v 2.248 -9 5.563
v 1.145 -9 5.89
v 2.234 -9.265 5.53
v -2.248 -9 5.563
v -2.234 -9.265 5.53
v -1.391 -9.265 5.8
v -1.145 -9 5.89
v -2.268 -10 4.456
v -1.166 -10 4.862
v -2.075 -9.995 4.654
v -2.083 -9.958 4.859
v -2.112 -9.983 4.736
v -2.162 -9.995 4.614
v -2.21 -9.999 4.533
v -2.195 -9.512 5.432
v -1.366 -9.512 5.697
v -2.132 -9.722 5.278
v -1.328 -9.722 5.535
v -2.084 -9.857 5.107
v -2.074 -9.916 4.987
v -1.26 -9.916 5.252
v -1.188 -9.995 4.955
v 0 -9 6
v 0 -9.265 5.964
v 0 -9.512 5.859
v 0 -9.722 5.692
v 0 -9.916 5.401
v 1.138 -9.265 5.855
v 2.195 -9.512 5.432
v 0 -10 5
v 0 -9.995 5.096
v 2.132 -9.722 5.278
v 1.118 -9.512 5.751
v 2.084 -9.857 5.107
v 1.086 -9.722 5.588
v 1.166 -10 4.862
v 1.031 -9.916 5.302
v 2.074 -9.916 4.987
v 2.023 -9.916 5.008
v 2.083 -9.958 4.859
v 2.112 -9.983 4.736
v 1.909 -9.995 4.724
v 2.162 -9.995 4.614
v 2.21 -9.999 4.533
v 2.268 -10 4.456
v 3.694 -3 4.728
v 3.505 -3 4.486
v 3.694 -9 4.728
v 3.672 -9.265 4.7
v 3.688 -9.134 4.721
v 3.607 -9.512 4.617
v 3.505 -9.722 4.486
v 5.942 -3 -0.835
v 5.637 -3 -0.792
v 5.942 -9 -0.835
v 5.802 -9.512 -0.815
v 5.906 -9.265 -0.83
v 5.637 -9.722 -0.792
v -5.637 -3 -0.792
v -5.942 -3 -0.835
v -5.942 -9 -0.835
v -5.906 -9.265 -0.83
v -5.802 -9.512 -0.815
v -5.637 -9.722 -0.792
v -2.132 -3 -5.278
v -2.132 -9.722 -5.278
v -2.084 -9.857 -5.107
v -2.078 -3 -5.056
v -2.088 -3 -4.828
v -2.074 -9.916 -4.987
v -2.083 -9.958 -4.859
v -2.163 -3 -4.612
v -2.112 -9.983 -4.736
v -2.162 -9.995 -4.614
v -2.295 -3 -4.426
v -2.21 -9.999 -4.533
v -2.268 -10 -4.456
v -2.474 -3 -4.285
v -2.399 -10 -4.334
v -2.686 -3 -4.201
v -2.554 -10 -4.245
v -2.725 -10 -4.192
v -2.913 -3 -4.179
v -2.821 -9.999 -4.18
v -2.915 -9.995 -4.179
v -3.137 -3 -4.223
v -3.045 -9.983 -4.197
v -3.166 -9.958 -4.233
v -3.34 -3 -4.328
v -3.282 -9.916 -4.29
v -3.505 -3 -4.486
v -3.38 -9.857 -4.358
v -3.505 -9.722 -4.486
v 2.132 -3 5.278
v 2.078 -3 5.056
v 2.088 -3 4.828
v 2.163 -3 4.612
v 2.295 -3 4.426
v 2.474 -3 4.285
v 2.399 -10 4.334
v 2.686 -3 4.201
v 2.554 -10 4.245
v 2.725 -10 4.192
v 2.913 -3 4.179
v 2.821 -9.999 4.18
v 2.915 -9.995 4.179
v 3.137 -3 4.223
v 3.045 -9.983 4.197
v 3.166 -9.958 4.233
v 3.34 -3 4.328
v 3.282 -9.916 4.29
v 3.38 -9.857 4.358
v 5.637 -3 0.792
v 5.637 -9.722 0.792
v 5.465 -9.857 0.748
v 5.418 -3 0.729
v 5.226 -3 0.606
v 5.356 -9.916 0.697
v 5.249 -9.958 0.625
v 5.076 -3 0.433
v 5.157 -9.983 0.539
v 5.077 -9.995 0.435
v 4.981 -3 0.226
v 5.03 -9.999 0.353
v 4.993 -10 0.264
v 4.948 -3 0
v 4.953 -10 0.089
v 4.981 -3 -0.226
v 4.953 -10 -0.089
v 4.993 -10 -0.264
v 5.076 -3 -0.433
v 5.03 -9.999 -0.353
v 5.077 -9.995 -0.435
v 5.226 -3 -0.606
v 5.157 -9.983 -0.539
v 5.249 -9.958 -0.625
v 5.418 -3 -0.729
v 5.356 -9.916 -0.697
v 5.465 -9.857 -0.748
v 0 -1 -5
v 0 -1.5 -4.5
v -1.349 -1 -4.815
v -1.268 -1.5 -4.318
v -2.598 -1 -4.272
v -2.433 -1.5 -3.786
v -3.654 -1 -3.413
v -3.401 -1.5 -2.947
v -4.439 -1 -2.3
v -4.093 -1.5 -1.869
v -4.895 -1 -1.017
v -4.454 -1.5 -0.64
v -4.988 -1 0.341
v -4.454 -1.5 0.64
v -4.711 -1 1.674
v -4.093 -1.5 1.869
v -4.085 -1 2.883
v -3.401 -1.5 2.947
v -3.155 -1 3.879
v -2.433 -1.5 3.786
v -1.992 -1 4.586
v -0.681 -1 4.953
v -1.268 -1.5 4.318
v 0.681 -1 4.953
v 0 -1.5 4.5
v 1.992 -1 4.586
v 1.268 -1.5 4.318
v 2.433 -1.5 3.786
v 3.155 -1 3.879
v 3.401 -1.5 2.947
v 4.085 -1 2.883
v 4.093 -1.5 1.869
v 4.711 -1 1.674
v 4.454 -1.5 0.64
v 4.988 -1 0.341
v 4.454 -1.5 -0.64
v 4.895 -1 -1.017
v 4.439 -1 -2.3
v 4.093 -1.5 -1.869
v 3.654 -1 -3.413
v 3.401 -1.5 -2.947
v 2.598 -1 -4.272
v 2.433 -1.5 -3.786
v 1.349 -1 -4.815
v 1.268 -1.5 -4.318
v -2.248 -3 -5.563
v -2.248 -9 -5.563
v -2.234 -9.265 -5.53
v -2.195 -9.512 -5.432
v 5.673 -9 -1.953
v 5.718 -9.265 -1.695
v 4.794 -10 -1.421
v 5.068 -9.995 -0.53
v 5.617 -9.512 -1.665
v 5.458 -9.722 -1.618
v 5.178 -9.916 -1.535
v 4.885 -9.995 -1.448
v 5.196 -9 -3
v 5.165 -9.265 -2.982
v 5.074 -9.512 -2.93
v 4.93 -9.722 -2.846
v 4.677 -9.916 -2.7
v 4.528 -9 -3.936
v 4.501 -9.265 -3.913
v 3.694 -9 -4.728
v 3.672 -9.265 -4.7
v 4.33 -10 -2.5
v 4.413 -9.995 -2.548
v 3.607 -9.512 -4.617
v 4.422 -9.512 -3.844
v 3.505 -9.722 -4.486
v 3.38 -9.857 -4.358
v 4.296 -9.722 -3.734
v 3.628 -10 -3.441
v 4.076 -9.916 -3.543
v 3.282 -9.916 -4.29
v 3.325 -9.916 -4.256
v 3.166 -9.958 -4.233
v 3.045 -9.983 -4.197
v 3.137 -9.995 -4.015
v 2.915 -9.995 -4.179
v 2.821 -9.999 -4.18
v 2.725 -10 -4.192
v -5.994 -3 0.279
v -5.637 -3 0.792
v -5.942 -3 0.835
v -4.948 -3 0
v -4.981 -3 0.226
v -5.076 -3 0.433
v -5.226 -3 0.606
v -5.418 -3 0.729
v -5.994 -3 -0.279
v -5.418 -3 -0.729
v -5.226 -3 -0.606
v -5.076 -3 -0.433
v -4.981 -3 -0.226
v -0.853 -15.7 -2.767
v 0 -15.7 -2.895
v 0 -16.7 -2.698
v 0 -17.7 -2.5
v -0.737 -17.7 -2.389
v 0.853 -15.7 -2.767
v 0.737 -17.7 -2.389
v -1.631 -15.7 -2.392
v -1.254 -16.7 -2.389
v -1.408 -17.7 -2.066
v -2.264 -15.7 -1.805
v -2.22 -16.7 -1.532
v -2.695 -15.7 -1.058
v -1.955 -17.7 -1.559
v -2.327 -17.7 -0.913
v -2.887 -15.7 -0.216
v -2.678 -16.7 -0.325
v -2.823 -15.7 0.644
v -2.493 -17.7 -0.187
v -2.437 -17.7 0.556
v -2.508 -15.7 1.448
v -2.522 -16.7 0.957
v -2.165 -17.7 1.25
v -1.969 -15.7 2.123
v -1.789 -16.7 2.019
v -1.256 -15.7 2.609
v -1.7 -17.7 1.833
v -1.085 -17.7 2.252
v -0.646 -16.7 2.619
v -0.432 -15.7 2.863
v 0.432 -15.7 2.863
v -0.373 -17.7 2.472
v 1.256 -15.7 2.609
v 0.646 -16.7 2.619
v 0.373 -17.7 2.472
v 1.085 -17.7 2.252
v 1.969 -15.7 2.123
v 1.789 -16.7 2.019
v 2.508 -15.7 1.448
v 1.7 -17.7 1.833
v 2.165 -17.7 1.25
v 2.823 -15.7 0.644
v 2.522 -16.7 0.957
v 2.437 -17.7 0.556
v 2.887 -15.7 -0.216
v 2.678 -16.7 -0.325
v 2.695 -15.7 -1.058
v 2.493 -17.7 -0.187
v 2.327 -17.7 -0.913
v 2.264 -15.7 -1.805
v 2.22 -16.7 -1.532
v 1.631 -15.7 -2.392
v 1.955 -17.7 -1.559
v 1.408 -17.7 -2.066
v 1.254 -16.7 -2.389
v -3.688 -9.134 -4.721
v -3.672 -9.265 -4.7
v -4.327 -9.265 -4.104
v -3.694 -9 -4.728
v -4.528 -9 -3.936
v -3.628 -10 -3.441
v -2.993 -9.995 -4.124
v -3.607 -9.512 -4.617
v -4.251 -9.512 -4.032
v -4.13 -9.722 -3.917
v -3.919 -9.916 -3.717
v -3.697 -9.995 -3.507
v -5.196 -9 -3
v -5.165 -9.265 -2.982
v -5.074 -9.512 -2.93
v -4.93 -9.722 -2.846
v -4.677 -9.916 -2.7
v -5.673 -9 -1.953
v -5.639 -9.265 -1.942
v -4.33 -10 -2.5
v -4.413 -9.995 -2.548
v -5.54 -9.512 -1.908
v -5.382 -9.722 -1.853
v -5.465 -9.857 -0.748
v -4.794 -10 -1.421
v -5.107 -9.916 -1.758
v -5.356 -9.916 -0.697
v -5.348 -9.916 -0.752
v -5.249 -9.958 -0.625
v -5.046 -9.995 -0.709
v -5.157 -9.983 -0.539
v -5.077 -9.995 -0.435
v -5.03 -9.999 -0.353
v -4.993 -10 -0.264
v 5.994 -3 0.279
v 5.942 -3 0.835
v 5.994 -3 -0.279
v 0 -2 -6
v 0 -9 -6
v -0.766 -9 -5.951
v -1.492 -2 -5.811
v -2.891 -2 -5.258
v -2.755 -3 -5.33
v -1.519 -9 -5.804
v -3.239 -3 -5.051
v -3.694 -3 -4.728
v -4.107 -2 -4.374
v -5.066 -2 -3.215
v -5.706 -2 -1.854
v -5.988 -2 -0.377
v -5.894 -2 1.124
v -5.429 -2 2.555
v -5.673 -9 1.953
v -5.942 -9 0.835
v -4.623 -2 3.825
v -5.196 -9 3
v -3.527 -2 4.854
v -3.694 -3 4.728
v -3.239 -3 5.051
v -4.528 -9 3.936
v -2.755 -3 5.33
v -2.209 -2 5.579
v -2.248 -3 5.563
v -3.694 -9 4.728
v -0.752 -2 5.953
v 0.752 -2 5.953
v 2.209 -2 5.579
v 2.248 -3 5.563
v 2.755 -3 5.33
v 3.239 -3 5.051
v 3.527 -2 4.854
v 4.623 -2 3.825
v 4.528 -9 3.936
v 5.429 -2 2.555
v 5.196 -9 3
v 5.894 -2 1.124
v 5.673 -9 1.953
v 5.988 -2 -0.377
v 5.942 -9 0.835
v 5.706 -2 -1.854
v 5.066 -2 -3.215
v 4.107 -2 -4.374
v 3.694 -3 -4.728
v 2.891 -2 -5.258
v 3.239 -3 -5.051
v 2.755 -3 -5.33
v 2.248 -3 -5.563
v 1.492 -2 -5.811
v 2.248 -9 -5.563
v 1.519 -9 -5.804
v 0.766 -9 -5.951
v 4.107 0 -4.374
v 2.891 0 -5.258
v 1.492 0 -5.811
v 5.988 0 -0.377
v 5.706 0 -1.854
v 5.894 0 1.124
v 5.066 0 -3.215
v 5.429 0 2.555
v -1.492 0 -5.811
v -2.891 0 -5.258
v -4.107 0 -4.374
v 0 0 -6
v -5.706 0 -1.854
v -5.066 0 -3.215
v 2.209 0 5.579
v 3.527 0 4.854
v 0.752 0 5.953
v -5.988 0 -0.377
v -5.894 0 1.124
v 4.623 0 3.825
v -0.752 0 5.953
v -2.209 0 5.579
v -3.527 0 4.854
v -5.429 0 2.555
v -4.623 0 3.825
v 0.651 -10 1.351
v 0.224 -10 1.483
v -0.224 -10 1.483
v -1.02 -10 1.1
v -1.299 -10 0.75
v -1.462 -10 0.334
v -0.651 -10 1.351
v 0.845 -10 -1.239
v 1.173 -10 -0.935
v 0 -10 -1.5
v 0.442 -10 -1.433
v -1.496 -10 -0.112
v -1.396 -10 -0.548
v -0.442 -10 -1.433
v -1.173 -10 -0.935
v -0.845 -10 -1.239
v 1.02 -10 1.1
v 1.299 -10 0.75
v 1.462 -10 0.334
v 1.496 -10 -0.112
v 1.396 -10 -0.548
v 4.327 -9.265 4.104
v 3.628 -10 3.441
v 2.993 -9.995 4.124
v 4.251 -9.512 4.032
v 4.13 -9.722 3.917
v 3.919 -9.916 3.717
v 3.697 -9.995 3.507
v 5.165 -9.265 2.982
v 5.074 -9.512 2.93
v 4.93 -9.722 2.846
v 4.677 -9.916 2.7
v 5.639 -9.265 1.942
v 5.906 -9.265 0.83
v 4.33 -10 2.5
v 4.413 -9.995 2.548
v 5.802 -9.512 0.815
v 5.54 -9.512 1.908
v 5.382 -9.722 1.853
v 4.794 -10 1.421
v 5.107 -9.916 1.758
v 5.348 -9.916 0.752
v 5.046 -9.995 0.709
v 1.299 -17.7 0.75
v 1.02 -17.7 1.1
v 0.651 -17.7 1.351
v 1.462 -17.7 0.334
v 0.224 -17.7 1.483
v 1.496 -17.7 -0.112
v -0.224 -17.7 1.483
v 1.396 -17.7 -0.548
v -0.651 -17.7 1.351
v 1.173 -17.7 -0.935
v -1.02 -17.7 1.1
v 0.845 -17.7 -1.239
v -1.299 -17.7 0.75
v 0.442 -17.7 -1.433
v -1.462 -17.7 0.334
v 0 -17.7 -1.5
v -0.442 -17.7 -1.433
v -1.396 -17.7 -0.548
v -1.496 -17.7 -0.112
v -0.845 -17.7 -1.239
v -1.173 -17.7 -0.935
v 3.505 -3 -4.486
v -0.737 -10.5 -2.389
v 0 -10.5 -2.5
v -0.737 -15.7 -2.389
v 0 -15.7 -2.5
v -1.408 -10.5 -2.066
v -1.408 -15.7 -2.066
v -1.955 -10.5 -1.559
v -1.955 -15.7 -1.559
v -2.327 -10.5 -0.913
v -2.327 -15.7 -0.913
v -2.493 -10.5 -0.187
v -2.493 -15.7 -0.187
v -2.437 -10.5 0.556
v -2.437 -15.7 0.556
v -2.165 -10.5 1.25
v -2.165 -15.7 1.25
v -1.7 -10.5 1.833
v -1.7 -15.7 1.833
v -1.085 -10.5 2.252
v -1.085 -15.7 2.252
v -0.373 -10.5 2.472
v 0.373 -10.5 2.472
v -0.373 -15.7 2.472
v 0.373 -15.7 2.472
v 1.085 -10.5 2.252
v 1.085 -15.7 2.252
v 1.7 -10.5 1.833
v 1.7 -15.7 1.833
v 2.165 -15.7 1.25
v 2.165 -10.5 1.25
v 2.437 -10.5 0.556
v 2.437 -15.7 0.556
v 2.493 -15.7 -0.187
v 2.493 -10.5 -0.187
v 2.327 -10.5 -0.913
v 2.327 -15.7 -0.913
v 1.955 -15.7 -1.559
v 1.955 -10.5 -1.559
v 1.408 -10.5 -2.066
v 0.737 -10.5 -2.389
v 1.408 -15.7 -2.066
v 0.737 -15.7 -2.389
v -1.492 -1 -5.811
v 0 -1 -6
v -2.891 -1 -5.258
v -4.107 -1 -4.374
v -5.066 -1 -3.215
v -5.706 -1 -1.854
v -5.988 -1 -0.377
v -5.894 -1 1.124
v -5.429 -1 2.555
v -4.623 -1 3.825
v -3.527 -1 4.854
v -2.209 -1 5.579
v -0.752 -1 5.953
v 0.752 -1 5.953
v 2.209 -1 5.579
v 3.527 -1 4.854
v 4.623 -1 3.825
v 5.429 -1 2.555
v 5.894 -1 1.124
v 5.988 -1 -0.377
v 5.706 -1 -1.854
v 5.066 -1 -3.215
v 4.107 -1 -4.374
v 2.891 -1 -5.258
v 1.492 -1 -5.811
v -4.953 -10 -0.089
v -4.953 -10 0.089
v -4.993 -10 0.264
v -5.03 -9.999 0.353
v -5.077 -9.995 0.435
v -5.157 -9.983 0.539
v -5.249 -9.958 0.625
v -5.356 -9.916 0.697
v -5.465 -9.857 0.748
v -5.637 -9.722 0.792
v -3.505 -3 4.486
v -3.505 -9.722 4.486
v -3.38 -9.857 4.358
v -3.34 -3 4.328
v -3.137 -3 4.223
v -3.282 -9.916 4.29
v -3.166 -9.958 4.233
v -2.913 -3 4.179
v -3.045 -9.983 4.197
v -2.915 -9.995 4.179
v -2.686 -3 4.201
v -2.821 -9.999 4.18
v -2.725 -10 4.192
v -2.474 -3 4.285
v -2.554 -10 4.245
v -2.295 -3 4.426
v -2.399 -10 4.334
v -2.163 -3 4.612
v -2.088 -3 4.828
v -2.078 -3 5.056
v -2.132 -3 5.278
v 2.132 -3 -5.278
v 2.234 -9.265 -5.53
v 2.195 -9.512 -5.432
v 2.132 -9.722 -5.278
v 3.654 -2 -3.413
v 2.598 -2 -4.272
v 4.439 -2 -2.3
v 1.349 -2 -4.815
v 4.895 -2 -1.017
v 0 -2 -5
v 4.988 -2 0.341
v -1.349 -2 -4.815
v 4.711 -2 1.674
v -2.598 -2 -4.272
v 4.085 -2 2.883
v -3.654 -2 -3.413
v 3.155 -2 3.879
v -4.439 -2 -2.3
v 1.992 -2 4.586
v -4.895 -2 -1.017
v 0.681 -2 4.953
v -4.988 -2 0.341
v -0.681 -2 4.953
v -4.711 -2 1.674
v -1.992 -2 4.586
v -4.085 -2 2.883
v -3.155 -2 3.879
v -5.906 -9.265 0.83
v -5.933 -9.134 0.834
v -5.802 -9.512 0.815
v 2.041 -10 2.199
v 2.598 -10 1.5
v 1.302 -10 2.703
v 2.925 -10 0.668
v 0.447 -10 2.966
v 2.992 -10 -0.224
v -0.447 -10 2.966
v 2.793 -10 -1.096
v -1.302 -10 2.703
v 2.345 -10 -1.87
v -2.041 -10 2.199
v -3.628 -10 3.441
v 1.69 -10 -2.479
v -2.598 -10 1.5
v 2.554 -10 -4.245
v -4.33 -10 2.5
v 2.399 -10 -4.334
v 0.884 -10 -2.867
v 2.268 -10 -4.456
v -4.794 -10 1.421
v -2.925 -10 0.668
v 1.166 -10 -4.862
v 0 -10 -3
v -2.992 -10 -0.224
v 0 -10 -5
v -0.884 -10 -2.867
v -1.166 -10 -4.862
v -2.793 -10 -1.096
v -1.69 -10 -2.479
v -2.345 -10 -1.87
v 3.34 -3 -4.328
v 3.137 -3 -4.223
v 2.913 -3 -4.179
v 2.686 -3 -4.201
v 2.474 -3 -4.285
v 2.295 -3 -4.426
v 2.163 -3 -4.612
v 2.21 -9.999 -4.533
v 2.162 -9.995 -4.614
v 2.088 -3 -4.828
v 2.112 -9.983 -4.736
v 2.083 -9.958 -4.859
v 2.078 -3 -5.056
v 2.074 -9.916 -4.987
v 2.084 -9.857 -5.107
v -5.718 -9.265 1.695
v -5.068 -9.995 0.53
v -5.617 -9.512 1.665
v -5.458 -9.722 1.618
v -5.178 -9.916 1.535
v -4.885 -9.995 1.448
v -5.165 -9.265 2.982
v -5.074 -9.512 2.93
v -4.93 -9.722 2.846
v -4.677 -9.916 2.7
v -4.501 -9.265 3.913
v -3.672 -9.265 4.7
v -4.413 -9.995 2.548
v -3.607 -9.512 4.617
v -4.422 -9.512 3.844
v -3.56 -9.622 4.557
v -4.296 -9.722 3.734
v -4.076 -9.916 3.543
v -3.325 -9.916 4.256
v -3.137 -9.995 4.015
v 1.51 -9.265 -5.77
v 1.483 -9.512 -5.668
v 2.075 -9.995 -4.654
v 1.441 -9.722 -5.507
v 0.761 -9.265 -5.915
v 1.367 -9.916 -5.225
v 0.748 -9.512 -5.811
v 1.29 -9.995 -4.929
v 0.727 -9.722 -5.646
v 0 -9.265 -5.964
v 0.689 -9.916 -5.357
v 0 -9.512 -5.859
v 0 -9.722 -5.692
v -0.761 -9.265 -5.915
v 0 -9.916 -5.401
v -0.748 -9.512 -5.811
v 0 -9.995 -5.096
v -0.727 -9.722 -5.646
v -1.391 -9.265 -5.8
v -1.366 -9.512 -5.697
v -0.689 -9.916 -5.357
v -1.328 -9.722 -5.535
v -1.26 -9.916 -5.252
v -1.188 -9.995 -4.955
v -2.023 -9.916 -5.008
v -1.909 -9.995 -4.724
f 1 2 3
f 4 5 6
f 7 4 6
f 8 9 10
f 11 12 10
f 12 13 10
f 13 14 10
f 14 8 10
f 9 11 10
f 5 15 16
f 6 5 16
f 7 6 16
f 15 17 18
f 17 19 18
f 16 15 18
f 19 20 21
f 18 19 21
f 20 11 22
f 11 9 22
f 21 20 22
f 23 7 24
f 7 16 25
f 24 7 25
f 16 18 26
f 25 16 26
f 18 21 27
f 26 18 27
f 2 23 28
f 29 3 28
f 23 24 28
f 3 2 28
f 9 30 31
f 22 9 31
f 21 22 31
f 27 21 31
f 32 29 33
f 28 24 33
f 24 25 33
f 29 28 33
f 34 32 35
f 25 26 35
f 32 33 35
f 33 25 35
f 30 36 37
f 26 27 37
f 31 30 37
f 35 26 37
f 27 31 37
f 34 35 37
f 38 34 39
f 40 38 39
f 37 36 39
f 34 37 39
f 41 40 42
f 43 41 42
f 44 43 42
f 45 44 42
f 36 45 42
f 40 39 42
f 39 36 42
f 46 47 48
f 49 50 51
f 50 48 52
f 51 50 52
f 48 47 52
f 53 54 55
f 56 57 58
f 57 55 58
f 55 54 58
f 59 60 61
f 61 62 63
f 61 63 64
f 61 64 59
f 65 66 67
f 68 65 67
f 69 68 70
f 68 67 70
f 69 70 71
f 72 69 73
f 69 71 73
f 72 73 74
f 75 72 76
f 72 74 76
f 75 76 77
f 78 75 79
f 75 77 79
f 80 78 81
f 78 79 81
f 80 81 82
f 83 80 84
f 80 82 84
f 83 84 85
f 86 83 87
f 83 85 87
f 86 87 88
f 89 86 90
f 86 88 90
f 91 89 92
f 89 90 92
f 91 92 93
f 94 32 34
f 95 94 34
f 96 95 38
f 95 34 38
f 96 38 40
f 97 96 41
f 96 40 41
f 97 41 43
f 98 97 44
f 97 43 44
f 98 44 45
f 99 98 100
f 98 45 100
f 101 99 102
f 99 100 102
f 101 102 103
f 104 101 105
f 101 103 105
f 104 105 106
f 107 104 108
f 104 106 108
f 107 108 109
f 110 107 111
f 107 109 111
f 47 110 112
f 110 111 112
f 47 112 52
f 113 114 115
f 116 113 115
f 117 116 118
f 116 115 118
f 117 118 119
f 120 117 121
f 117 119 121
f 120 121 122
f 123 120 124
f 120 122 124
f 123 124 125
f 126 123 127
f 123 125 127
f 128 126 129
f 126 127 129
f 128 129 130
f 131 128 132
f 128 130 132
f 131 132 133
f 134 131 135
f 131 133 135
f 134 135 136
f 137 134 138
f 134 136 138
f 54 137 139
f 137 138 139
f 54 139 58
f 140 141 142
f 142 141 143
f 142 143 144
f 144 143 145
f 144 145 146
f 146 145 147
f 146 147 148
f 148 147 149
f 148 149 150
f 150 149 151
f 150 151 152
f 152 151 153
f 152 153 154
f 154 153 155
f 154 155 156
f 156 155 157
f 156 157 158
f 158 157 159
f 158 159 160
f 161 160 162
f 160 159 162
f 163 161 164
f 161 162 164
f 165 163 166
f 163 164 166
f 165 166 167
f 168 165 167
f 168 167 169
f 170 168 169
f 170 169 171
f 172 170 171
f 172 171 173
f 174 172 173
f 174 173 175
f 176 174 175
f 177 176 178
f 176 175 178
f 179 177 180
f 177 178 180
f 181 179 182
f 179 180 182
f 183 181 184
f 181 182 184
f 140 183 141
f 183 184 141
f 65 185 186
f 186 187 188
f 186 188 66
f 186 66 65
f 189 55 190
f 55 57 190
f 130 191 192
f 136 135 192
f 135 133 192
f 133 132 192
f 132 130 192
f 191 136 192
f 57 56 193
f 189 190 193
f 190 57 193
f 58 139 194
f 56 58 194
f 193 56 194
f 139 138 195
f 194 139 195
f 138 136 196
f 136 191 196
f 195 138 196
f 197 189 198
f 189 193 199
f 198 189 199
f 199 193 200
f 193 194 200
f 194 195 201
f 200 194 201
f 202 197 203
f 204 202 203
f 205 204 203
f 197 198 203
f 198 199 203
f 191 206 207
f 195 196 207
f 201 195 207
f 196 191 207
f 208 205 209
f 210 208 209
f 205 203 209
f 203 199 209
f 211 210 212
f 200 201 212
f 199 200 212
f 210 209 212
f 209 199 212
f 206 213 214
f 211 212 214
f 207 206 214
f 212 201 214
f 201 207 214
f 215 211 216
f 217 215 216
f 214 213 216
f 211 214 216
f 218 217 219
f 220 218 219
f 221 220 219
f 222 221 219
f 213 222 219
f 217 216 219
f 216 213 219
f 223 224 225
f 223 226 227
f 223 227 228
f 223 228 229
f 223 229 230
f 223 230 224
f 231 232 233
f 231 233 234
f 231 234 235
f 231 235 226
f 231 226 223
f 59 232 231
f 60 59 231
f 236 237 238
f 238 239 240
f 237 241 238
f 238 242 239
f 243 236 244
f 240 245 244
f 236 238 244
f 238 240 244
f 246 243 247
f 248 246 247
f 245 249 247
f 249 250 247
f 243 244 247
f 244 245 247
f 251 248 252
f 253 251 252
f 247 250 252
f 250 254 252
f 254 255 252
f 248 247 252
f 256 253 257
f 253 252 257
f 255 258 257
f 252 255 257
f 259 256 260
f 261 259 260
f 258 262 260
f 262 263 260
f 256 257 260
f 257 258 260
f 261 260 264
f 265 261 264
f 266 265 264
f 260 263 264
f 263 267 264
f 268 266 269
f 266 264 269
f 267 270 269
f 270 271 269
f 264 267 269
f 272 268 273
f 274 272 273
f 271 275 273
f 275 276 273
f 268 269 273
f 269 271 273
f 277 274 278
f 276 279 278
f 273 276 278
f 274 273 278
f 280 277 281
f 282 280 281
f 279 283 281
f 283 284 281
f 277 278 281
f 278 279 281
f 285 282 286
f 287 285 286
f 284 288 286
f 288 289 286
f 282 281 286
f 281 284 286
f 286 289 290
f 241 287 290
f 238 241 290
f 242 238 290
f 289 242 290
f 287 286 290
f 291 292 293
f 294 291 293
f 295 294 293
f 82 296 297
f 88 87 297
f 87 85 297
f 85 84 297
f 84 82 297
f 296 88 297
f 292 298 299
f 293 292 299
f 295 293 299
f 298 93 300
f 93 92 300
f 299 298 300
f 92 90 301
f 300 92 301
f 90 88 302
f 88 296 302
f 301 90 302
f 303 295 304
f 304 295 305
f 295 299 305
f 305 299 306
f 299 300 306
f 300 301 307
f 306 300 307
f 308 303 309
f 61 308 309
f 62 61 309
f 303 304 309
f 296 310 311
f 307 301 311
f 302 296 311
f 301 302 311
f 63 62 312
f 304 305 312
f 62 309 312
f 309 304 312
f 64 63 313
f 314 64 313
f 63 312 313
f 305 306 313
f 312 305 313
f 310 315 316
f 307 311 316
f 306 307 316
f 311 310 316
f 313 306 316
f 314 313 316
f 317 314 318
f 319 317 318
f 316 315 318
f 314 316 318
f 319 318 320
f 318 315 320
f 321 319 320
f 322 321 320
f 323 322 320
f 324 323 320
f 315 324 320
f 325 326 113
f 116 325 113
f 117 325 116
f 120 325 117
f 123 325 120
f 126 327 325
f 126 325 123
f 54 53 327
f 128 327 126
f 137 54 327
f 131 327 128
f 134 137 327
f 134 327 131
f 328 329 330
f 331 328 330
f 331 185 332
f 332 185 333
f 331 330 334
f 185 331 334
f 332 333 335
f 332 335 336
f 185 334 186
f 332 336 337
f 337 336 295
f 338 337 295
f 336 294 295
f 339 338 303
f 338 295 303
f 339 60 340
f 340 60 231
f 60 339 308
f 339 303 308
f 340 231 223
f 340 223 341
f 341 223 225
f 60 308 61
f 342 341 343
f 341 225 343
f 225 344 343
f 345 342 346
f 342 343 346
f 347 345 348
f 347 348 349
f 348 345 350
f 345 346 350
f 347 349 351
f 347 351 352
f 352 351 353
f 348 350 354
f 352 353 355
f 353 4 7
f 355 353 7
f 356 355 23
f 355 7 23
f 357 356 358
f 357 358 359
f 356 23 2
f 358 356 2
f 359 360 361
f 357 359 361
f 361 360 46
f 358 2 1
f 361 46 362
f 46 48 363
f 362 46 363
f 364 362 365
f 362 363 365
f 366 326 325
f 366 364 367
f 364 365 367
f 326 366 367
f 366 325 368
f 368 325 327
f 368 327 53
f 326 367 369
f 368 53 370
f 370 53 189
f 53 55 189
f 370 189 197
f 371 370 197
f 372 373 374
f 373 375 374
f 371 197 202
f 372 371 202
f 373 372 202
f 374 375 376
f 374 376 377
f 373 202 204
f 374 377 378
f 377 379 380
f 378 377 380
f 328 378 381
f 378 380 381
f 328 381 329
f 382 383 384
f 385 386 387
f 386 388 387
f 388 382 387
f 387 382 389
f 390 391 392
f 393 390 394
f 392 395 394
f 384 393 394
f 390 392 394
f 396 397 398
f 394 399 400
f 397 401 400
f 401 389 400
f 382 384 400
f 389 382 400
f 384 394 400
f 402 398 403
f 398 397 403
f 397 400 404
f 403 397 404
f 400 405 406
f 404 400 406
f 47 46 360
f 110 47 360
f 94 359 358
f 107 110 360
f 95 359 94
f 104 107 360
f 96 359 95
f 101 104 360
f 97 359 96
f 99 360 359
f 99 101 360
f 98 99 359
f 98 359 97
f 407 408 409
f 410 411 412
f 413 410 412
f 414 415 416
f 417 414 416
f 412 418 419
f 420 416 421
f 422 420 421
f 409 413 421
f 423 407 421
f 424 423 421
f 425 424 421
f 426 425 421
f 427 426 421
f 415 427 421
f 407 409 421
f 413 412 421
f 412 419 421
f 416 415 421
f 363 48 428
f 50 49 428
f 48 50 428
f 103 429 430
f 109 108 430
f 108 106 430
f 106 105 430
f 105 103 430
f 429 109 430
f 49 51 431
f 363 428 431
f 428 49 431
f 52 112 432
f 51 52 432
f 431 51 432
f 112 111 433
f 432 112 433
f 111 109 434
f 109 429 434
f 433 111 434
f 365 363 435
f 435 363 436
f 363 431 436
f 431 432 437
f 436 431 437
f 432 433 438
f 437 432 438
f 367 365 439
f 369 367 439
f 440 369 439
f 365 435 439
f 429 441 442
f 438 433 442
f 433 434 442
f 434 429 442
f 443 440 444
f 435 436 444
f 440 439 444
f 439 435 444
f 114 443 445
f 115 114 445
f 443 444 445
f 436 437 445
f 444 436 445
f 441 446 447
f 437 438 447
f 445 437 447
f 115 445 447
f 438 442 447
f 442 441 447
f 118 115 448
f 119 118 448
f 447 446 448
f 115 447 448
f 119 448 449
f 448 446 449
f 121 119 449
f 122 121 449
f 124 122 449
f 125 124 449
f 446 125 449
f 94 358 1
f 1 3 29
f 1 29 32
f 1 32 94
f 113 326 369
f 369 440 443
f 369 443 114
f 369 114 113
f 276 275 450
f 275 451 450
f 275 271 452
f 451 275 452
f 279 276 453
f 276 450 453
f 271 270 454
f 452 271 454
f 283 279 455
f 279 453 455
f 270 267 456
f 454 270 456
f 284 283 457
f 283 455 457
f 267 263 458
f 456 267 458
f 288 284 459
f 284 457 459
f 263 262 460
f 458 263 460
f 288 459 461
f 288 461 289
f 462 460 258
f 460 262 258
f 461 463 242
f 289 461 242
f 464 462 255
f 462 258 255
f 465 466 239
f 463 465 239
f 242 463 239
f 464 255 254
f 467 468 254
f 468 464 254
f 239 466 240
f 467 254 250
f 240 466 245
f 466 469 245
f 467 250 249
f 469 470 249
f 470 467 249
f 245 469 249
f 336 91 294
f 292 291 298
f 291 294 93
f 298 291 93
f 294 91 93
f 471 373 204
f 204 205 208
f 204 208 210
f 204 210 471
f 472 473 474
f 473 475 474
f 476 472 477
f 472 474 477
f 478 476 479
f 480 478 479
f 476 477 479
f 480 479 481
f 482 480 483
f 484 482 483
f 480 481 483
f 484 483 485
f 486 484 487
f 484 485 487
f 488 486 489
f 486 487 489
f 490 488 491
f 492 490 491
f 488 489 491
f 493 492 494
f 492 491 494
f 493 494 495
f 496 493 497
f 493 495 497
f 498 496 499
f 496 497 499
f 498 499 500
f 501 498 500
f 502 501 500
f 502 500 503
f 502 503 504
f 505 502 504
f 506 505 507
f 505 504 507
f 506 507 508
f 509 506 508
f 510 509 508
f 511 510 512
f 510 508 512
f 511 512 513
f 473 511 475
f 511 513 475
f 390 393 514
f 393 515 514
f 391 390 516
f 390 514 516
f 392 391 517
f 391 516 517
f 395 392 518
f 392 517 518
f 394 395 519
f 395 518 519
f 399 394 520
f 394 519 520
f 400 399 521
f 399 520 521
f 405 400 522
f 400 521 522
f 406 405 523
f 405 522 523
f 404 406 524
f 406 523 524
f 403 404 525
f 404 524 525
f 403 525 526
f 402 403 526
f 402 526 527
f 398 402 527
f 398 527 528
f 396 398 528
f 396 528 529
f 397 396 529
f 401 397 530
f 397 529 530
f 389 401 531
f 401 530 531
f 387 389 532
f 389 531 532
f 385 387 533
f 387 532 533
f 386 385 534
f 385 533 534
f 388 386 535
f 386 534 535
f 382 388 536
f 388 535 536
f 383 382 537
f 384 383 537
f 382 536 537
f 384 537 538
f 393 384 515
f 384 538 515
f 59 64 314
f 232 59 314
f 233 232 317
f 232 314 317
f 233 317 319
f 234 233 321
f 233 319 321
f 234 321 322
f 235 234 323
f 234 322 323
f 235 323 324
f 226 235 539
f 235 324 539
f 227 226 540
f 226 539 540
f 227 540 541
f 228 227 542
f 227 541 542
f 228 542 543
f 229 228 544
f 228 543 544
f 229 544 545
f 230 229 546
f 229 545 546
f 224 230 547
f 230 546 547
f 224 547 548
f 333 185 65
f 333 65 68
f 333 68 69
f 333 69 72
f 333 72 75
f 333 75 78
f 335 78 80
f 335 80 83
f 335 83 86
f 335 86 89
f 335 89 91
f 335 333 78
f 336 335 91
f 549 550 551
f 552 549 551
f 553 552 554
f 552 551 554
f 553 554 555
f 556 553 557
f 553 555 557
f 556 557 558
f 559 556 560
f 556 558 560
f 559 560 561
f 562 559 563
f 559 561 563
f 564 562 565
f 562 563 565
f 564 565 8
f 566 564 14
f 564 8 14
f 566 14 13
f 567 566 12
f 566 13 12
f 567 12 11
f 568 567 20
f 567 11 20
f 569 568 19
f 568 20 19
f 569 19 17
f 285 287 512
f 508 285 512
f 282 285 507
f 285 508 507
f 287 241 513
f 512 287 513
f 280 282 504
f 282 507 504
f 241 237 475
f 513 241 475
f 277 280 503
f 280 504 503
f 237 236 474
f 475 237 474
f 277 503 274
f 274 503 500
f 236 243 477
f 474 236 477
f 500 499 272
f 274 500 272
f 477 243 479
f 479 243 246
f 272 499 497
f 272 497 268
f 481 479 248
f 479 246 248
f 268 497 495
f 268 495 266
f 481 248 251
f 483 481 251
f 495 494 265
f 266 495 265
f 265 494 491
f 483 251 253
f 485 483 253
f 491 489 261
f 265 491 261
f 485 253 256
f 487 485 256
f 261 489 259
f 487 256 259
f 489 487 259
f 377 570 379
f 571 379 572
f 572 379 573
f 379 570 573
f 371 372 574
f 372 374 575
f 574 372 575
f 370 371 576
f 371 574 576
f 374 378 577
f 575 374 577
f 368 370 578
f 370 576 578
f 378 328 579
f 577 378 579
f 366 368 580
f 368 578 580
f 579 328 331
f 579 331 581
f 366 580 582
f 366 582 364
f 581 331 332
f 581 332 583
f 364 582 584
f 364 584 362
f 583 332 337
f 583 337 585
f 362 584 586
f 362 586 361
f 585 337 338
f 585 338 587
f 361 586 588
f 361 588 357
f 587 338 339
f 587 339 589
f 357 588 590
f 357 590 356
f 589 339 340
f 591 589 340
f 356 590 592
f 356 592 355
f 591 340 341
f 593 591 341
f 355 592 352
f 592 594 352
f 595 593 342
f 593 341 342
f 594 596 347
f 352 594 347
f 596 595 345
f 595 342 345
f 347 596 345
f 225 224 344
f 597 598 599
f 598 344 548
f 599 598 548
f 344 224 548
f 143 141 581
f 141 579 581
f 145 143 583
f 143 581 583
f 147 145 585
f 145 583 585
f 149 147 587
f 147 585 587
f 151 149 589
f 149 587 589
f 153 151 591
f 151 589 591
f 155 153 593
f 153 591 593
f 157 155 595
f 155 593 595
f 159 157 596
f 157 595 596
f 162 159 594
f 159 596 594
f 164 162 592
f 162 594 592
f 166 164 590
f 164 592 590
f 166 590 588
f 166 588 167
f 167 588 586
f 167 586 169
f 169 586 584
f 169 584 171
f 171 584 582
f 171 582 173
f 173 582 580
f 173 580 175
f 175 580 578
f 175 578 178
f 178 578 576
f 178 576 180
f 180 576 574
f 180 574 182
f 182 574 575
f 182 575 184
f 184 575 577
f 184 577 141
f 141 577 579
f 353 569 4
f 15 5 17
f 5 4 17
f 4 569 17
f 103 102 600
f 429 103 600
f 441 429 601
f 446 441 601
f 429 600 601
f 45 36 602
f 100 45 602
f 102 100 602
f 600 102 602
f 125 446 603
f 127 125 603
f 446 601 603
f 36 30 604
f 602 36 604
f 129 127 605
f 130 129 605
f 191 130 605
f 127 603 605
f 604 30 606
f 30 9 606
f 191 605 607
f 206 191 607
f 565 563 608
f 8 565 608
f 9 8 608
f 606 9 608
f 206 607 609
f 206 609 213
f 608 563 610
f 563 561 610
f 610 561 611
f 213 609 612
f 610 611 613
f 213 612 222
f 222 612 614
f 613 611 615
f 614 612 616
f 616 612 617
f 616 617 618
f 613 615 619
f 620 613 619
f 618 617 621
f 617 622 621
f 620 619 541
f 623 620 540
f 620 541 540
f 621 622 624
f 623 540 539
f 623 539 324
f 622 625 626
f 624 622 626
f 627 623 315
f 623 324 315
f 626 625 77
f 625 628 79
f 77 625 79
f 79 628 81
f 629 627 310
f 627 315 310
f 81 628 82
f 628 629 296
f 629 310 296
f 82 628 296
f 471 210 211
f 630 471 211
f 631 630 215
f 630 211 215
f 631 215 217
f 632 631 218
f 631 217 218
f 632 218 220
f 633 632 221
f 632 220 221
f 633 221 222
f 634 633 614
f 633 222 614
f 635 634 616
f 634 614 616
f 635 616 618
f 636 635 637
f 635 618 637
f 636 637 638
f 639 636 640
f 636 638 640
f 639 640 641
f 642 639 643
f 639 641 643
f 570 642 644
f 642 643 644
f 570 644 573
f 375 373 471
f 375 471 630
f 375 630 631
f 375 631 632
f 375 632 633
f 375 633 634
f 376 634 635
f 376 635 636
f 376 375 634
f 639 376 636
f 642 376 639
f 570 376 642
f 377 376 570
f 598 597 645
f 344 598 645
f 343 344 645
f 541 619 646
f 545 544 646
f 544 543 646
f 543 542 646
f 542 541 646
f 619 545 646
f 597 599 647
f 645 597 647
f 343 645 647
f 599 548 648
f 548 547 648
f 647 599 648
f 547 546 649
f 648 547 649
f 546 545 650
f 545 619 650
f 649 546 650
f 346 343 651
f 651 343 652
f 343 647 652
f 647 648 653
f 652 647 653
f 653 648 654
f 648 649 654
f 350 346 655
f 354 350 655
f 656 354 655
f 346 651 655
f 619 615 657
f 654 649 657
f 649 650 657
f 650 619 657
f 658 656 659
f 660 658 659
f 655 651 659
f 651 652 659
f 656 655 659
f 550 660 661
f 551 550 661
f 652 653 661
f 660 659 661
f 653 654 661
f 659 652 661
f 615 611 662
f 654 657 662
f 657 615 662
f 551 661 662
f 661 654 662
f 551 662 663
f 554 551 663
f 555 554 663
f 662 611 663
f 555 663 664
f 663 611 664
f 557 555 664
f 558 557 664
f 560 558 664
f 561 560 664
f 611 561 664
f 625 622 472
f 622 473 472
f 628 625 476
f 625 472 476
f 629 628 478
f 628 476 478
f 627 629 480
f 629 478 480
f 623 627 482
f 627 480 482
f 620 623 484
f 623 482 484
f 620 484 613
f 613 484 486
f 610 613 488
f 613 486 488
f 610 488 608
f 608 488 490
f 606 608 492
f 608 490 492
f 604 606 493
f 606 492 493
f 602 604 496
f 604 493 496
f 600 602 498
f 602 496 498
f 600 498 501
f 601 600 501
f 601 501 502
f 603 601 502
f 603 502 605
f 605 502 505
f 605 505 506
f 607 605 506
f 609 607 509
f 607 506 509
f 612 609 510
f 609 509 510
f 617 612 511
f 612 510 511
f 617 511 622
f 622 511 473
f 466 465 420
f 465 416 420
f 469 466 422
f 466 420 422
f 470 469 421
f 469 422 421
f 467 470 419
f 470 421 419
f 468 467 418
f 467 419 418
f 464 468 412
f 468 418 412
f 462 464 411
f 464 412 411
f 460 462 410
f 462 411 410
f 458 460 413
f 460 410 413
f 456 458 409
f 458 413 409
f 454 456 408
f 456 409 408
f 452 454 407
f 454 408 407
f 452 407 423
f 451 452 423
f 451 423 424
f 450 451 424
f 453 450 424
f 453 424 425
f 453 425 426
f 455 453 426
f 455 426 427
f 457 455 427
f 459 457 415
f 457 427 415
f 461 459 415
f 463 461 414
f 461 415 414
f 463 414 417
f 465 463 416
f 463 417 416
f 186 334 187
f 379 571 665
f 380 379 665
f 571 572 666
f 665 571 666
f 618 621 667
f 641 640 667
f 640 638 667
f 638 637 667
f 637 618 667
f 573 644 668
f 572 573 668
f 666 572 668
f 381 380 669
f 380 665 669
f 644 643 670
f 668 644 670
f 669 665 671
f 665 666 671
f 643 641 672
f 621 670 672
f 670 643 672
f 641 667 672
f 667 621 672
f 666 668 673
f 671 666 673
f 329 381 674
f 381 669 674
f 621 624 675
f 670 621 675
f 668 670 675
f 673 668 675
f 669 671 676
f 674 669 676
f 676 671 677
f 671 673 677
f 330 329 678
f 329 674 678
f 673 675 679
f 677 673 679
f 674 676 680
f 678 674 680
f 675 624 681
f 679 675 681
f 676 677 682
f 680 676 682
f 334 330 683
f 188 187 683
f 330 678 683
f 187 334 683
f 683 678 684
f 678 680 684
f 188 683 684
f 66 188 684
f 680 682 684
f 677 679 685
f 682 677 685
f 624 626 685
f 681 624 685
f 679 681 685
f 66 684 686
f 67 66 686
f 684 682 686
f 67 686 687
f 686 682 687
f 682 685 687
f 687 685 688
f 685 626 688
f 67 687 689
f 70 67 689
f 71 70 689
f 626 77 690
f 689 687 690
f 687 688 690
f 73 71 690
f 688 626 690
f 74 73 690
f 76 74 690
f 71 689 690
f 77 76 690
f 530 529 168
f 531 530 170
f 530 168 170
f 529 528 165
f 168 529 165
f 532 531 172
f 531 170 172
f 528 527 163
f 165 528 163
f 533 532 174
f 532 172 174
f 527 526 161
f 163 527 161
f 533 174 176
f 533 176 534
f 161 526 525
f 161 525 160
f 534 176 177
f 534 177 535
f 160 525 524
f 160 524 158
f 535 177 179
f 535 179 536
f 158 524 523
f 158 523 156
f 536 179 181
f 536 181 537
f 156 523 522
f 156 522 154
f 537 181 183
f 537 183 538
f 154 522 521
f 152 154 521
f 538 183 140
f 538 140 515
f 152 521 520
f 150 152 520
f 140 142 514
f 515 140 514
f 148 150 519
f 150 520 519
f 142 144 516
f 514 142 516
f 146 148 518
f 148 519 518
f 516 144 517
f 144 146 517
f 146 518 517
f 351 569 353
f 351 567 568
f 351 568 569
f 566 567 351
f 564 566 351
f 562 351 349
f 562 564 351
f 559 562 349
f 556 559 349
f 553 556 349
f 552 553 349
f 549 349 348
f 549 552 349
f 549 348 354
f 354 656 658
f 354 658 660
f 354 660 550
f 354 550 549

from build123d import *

# Parameters (mm, degrees)
CUT_EXTRUDE1_DEPTH      = 7
CUT_EXTRUDE1_DEPTH_BACK = 7


with BuildPart() as part:
    # Sketch1 → Revolve1 (revolve)
    with BuildSketch(Plane(origin=(0, 0, 0), x_dir=(0, 0, -1), z_dir=(1, 0, 0))):
        with BuildLine():
            Line((0, 0), (6, 0))
            Line((6, 0), (6, -1))
            Line((6, -1), (5, -1))
            Line((5, -1), (4.5, -1.5))
            Line((4.5, -1.5), (5, -2))
            Line((5, -2), (6, -2))
            Line((6, -2), (6, -9))
            ThreePointArc((6, -9), (5.707106781, -9.707106781), (5, -10))
            Line((5, -10), (3, -10))
            Line((3, -10), (2.5, -10.5))
            Line((2.5, -10.5), (2.5, -15.7))
            Line((2.5, -15.7), (2.895480226, -15.7))
            Line((2.895480226, -15.7), (2.5, -17.7))
            Line((2.5, -17.7), (1.5, -17.7))
            Line((1.5, -17.7), (1.5, -10))
            Line((1.5, -10), (0, -10))
            Line((0, -10), (0, 0))
        make_face()
    revolve(axis=Axis((0, -17.7, 0), (0, 1, 0)))

    # Sketch2 → Cut-Extrude1 (cut, two sides)
    with BuildSketch(Plane(origin=(0, -10, 0), x_dir=(-1, 0, 0), z_dir=(0, -1, 0))) as cut_extrude1_sk:
        with BuildLine():
            Line((-1, -14.966629547), (-1, -9.949874371))
            ThreePointArc((-1, -9.949874371), (-2.397127157, -9.708438669), (-3.746065934, -9.271838546))
            Line((-3.746065934, -9.271838546), (-2.13237153, -5.277804741))
            ThreePointArc((-2.13237153, -5.277804741), (-2.474118614, -4.285299143), (-3.504527217, -4.485590286))
            Line((-3.504527217, -4.485590286), (-6.156614753, -7.880107536))
            ThreePointArc((-6.156614753, -7.880107536), (-8.660254038, -5), (-9.902680687, -1.39173101))
            Line((-9.902680687, -1.39173101), (-5.636898747, -0.792214455))
            ThreePointArc((-5.636898747, -0.792214455), (-4.948237227, 0), (-5.636898747, 0.792214455))
            Line((-5.636898747, 0.792214455), (-9.902680687, 1.39173101))
            ThreePointArc((-9.902680687, 1.39173101), (-8.660254038, 5), (-6.156614753, 7.880107536))
            Line((-6.156614753, 7.880107536), (-3.504527217, 4.485590286))
            ThreePointArc((-3.504527217, 4.485590286), (-2.474118614, 4.285299143), (-2.13237153, 5.277804741))
            Line((-2.13237153, 5.277804741), (-3.746065934, 9.271838546))
            ThreePointArc((-3.746065934, 9.271838546), (0, 10), (3.746065934, 9.271838546))
            Line((3.746065934, 9.271838546), (2.13237153, 5.277804741))
            ThreePointArc((2.13237153, 5.277804741), (2.474118614, 4.285299143), (3.504527217, 4.485590286))
            Line((3.504527217, 4.485590286), (6.156614753, 7.880107536))
            ThreePointArc((6.156614753, 7.880107536), (8.660254038, 5), (9.902680687, 1.39173101))
            Line((9.902680687, 1.39173101), (5.636898747, 0.792214455))
            ThreePointArc((5.636898747, 0.792214455), (4.948237227, 0), (5.636898747, -0.792214455))
            Line((5.636898747, -0.792214455), (9.902680687, -1.39173101))
            ThreePointArc((9.902680687, -1.39173101), (8.660254038, -5), (6.156614753, -7.880107536))
            Line((6.156614753, -7.880107536), (3.504527217, -4.485590286))
            ThreePointArc((3.504527217, -4.485590286), (2.474118614, -4.285299143), (2.13237153, -5.277804741))
            Line((2.13237153, -5.277804741), (3.746065934, -9.271838546))
            ThreePointArc((3.746065934, -9.271838546), (1.908089954, -9.816271834), (0, -10))
            Line((0, -10), (0, -15))
            ThreePointArc((0, -15), (0.500278319, 14.991655066), (-1, -14.966629547))
        make_face()
    extrude(amount=CUT_EXTRUDE1_DEPTH, mode=Mode.SUBTRACT)
    extrude(cut_extrude1_sk.sketch, amount=-CUT_EXTRUDE1_DEPTH_BACK, mode=Mode.SUBTRACT)


solid = part.part
